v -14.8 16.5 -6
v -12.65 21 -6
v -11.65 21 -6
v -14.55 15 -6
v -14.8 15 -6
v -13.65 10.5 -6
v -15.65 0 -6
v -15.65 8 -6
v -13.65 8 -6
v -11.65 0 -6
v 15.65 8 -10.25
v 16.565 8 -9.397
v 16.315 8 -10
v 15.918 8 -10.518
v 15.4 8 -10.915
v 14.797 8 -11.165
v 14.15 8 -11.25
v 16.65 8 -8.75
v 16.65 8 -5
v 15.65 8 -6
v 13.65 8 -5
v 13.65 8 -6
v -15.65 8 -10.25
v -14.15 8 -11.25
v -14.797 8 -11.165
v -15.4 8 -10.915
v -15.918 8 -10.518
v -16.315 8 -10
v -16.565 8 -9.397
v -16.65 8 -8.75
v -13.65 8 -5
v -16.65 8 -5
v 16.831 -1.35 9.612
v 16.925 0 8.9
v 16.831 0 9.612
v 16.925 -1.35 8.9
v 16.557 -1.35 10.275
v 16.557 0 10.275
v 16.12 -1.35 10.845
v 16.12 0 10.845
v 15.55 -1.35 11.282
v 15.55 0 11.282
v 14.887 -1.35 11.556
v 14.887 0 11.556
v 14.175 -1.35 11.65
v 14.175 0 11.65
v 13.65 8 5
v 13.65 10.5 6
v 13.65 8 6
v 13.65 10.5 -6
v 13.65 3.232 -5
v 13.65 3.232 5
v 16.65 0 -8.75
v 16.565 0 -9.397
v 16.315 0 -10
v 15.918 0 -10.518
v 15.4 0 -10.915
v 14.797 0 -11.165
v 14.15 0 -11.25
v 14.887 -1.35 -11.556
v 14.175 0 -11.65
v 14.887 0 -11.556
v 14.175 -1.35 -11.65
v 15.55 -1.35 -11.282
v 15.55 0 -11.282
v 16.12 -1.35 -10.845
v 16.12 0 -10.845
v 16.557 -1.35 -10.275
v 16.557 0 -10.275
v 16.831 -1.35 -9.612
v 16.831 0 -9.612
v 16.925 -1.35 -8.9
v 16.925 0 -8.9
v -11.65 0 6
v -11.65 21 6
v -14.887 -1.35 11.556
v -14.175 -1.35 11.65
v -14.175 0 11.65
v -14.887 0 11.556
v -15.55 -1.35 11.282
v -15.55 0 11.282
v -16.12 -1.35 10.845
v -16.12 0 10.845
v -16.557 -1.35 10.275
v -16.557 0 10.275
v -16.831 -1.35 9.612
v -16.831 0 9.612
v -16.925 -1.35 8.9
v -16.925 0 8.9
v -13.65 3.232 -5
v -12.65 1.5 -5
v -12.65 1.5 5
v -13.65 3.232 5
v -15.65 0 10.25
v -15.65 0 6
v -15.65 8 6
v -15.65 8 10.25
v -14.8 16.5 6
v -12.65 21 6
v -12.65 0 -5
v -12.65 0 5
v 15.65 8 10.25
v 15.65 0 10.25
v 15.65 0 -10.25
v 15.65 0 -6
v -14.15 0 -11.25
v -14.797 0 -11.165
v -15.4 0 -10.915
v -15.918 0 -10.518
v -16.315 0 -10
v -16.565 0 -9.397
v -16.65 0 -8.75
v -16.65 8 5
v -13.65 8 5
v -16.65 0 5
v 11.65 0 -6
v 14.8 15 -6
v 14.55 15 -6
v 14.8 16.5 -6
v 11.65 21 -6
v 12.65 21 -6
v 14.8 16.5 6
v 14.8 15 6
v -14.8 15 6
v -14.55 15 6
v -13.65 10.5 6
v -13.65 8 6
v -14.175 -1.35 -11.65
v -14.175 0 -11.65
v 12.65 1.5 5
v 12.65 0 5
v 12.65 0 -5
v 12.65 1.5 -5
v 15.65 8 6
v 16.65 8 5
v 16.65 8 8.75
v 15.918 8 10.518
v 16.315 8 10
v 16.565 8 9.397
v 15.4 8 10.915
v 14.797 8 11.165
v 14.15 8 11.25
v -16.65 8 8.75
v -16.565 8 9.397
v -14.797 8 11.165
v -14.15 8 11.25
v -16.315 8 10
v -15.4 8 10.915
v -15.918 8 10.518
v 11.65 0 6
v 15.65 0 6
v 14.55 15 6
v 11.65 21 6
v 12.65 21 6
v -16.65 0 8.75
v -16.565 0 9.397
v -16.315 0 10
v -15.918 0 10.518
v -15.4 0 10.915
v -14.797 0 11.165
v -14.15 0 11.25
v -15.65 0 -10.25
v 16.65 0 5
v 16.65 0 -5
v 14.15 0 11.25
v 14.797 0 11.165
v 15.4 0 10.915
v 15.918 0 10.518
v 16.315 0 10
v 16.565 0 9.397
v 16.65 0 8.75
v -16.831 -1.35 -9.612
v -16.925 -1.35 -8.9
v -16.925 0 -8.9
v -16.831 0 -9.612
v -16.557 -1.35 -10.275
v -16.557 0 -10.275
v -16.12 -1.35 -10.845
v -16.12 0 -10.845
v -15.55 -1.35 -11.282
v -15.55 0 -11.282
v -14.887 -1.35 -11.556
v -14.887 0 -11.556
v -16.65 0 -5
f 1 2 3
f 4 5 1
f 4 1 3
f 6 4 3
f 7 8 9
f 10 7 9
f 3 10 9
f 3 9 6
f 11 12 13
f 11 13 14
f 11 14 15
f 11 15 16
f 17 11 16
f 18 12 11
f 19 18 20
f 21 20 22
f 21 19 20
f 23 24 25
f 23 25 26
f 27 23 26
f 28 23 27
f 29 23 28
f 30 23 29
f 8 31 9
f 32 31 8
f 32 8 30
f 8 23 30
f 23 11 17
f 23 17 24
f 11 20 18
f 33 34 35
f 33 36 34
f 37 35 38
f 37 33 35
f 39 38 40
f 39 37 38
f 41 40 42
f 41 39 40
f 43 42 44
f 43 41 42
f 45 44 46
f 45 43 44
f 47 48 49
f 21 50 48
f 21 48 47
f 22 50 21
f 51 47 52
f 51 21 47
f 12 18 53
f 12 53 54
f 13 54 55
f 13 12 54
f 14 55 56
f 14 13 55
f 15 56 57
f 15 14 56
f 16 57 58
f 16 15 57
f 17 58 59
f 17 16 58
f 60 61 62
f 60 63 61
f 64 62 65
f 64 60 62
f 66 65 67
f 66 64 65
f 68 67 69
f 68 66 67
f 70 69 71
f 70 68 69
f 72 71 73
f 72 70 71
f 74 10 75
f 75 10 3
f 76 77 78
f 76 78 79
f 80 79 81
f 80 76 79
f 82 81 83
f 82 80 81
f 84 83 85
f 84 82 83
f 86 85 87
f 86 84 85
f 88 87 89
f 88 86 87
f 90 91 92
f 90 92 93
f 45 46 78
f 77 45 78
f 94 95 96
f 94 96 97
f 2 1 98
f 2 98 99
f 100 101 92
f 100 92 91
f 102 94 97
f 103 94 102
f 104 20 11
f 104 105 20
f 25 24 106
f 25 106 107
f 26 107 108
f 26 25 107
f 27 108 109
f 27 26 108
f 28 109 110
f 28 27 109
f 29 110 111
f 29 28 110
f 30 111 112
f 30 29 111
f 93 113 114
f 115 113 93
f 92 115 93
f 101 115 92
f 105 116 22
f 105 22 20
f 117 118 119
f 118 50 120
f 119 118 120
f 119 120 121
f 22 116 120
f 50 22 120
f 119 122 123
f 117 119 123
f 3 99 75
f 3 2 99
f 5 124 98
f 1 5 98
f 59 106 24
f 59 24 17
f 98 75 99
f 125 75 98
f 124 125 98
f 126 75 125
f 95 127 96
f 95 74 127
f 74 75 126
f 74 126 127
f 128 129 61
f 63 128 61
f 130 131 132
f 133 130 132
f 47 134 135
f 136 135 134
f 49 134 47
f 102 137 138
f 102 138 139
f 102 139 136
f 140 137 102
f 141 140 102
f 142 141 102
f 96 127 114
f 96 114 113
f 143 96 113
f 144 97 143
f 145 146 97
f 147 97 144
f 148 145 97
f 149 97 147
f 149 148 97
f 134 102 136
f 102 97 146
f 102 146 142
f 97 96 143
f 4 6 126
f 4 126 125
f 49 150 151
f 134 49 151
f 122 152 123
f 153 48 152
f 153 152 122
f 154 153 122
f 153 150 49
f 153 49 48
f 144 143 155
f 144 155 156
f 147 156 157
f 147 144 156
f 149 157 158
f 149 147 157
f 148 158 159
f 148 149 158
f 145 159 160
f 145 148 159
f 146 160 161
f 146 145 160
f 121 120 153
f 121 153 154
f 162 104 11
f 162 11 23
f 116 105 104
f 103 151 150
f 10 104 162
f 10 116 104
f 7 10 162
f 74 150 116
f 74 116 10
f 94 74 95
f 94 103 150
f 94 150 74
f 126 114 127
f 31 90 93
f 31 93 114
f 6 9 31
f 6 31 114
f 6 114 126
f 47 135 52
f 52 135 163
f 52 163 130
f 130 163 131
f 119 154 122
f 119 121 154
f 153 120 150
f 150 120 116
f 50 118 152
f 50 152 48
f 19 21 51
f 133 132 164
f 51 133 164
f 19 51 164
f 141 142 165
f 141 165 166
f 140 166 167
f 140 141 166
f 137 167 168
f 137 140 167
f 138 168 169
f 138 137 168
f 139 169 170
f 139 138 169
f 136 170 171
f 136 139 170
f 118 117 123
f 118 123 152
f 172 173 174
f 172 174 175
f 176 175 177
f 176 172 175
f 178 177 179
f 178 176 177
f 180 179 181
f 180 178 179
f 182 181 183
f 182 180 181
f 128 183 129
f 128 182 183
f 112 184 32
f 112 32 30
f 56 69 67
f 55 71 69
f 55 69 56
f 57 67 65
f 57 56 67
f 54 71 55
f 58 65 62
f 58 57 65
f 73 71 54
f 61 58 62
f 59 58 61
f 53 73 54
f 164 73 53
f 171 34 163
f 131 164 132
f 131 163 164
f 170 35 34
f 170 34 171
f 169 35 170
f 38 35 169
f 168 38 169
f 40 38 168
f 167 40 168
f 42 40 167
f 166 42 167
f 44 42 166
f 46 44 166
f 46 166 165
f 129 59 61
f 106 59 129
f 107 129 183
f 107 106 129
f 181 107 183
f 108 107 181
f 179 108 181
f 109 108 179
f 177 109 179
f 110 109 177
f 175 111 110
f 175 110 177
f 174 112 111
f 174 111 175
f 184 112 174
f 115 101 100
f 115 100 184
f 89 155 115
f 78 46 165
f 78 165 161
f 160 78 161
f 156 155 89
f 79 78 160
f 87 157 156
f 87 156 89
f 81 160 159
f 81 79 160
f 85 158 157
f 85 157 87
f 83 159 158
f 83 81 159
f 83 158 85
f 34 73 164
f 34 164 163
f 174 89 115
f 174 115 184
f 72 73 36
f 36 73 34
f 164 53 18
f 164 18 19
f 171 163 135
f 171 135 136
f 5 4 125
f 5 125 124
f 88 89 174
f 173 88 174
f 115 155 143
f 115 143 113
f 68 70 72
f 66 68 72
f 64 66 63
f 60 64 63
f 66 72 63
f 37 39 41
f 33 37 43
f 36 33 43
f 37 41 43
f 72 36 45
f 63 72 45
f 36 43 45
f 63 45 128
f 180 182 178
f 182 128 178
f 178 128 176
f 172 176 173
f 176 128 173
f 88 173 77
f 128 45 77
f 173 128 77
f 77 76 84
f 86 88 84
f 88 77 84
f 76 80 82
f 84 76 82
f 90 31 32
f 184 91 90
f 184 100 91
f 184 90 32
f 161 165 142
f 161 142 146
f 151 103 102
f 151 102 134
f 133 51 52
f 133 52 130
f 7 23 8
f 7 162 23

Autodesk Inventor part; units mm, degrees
ref_plane "YZ Plane" through (0, 0, 0) normal (1, 0, 0) x (0, 1, 0)
ref_plane "XZ Plane" through (0, 0, 0) normal (0, 1, 0) x (-1, 0, 0)
ref_plane "XY Plane" through (0, 0, 0) normal (0, 0, 1) x (1, 0, 0)
sketch "Sketch - Main Body" plane through (0, 0, 0) normal (0, 1, 0) x (-1, 0, 0)
  line L0 (-16.925, 11.65) -> (16.925, 11.65)
  line L1 (16.925, 11.65) -> (16.925, -11.65)
  line L2 (16.925, -11.65) -> (-16.925, -11.65)
  line L3 (-16.925, -11.65) -> (-16.925, 11.65)
  line L4 (-16.925, 11.65) -> (16.925, -11.65) construction
  line L5 (16.925, 11.65) -> (-16.925, -11.65) construction
  line L6 (-16.65, 11.25) -> (16.65, 11.25)
  line L7 (16.65, -11.25) -> (-16.65, -11.25)
  line L8 (-16.65, 11.25) -> (16.65, -11.25) construction
  line L9 (16.65, 11.25) -> (-16.65, -11.25) construction
  line L10 (16.65, 5) -> (12.65, 5)
  line L11 (12.65, 5) -> (12.65, -5)
  line L12 (12.65, -5) -> (16.65, -5)
  line L13 (-16.65, 5) -> (-12.65, 5)
  line L14 (-12.65, 5) -> (-12.65, -5)
  line L15 (-12.65, -5) -> (-16.65, -5)
  line L16 (16.65, 11.25) -> (16.65, 5)
  line L17 (16.65, -5) -> (16.65, -11.25)
  line L18 (-16.65, -11.25) -> (-16.65, -5)
  line L19 (-16.65, 5) -> (-16.65, 11.25)
  line L20 (-15.65, -10.25) -> (15.65, -10.25)
  line L21 (15.65, -10.25) -> (15.65, -6)
  line L22 (15.65, -6) -> (11.65, -6)
  line L23 (11.65, -6) -> (11.65, 6)
  line L24 (11.65, 6) -> (15.65, 6)
  line L25 (15.65, 6) -> (15.65, 10.25)
  line L26 (15.65, 10.25) -> (-15.65, 10.25)
  line L27 (-15.65, 10.25) -> (-15.65, 6)
  line L28 (-15.65, 6) -> (-11.65, 6)
  line L29 (-11.65, 6) -> (-11.65, -6)
  line L30 (-11.65, -6) -> (-15.65, -6)
  line L31 (-15.65, -6) -> (-15.65, -10.25)
  circle A0 centre (-14.1819, 8.9069) radius 2.7431
  circle A1 centre (14.1819, -8.9069) radius 2.7431
  point P0 (0, 0)
  point P1 (12.65, 0)
  point P2 (0, 0)
  dimension "d0" = 33.85
  dimension "d1" = 23.3
  dimension "d2" = 33.3
  dimension "d3" = 22.5
  dimension "d4" = 10
  dimension "d5" = 4
  dimension "d6" = 1
  dimension "d26" = 38.98
  dimension "d27" = 5.4863
extrude "Extrusion1" add sketch "Sketch - Main Body" against normal blind 1.35
extrude "Extrusion2" add sketch "Sketch - Main Body" along normal blind 8 contours A0 L26 L27 L19 L6 | L6 L16 L10 L11 L12 L17 A1 L21 L22 L23 L24 L25 L26 A0 | A0 L19 L6 | A0 L27 L28 L29 L30 L31 L20 A1 L7 L18 L15 L14 L13 L19 | L17 A1 L7 L20 L21 | L17 L7 A1
sketch "Sketch2" plane through (0, 0, 0) normal (0, 0, 1) x (1, 0, 0)
  line L0 (-11.65, 0) -> (-11.65, 21)
  line L1 (-15.65, 0) -> (-11.65, 0) projected
  line L2 (-11.65, 0) -> (-12.8159, 0)
  line L3 (-12.65, 0) -> (-16.65, 0) projected
  line L4 (-12.65, 0) -> (-12.65, 1.5)
  line L5 (-12.65, 0) -> (-12.65, 8) projected
  line L6 (-12.65, 1.5) -> (-13.65, 3.2321)
  line L7 (-13.65, 3.2321) -> (-13.65, 10.5)
  line L8 (-13.65, 10.5) -> (-14.55, 15)
  line L9 (-14.55, 15) -> (-14.8, 15)
  line L10 (-14.8, 15) -> (-14.8, 16.5)
  line L11 (-14.8, 16.5) -> (-12.65, 21)
  line L12 (-12.65, 21) -> (-11.65, 21)
  line L13 (-16.65, 0) -> (-16.65, 8) projected
  point P0 (0, 0)
  dimension "d11" = 1.5
  dimension "d12" = 1.5
  dimension "d13" = 3
  dimension "d14" = 30
  dimension "d15" = 3.15
  dimension "d16" = 1
  dimension "d17" = 4.5
  dimension "d18" = 21
  dimension "d19" = 10.5
  dimension "d20" = 0.25
extrude "Extrusion3" add sketch "Sketch2" along normal mid plane 12
mirror "Mirror1" about plane through (0, 0, 0) normal (1, 0, 0) of "Extrusion3"
fillet "Fillet1" radius 2.5 4 edges at (16.65, 4, 11.25) (16.65, 4, -11.25) (-16.65, 4, -11.25) (-16.65, 4, 11.25)
fillet "Fillet2" radius 2.75 4 edges at (16.925, -0.675, 11.65) (-16.925, -0.675, 11.65) (16.925, -0.675, -11.65) (-16.925, -0.675, -11.65)
properties part number "Toyota Yaris Aux Cap"
